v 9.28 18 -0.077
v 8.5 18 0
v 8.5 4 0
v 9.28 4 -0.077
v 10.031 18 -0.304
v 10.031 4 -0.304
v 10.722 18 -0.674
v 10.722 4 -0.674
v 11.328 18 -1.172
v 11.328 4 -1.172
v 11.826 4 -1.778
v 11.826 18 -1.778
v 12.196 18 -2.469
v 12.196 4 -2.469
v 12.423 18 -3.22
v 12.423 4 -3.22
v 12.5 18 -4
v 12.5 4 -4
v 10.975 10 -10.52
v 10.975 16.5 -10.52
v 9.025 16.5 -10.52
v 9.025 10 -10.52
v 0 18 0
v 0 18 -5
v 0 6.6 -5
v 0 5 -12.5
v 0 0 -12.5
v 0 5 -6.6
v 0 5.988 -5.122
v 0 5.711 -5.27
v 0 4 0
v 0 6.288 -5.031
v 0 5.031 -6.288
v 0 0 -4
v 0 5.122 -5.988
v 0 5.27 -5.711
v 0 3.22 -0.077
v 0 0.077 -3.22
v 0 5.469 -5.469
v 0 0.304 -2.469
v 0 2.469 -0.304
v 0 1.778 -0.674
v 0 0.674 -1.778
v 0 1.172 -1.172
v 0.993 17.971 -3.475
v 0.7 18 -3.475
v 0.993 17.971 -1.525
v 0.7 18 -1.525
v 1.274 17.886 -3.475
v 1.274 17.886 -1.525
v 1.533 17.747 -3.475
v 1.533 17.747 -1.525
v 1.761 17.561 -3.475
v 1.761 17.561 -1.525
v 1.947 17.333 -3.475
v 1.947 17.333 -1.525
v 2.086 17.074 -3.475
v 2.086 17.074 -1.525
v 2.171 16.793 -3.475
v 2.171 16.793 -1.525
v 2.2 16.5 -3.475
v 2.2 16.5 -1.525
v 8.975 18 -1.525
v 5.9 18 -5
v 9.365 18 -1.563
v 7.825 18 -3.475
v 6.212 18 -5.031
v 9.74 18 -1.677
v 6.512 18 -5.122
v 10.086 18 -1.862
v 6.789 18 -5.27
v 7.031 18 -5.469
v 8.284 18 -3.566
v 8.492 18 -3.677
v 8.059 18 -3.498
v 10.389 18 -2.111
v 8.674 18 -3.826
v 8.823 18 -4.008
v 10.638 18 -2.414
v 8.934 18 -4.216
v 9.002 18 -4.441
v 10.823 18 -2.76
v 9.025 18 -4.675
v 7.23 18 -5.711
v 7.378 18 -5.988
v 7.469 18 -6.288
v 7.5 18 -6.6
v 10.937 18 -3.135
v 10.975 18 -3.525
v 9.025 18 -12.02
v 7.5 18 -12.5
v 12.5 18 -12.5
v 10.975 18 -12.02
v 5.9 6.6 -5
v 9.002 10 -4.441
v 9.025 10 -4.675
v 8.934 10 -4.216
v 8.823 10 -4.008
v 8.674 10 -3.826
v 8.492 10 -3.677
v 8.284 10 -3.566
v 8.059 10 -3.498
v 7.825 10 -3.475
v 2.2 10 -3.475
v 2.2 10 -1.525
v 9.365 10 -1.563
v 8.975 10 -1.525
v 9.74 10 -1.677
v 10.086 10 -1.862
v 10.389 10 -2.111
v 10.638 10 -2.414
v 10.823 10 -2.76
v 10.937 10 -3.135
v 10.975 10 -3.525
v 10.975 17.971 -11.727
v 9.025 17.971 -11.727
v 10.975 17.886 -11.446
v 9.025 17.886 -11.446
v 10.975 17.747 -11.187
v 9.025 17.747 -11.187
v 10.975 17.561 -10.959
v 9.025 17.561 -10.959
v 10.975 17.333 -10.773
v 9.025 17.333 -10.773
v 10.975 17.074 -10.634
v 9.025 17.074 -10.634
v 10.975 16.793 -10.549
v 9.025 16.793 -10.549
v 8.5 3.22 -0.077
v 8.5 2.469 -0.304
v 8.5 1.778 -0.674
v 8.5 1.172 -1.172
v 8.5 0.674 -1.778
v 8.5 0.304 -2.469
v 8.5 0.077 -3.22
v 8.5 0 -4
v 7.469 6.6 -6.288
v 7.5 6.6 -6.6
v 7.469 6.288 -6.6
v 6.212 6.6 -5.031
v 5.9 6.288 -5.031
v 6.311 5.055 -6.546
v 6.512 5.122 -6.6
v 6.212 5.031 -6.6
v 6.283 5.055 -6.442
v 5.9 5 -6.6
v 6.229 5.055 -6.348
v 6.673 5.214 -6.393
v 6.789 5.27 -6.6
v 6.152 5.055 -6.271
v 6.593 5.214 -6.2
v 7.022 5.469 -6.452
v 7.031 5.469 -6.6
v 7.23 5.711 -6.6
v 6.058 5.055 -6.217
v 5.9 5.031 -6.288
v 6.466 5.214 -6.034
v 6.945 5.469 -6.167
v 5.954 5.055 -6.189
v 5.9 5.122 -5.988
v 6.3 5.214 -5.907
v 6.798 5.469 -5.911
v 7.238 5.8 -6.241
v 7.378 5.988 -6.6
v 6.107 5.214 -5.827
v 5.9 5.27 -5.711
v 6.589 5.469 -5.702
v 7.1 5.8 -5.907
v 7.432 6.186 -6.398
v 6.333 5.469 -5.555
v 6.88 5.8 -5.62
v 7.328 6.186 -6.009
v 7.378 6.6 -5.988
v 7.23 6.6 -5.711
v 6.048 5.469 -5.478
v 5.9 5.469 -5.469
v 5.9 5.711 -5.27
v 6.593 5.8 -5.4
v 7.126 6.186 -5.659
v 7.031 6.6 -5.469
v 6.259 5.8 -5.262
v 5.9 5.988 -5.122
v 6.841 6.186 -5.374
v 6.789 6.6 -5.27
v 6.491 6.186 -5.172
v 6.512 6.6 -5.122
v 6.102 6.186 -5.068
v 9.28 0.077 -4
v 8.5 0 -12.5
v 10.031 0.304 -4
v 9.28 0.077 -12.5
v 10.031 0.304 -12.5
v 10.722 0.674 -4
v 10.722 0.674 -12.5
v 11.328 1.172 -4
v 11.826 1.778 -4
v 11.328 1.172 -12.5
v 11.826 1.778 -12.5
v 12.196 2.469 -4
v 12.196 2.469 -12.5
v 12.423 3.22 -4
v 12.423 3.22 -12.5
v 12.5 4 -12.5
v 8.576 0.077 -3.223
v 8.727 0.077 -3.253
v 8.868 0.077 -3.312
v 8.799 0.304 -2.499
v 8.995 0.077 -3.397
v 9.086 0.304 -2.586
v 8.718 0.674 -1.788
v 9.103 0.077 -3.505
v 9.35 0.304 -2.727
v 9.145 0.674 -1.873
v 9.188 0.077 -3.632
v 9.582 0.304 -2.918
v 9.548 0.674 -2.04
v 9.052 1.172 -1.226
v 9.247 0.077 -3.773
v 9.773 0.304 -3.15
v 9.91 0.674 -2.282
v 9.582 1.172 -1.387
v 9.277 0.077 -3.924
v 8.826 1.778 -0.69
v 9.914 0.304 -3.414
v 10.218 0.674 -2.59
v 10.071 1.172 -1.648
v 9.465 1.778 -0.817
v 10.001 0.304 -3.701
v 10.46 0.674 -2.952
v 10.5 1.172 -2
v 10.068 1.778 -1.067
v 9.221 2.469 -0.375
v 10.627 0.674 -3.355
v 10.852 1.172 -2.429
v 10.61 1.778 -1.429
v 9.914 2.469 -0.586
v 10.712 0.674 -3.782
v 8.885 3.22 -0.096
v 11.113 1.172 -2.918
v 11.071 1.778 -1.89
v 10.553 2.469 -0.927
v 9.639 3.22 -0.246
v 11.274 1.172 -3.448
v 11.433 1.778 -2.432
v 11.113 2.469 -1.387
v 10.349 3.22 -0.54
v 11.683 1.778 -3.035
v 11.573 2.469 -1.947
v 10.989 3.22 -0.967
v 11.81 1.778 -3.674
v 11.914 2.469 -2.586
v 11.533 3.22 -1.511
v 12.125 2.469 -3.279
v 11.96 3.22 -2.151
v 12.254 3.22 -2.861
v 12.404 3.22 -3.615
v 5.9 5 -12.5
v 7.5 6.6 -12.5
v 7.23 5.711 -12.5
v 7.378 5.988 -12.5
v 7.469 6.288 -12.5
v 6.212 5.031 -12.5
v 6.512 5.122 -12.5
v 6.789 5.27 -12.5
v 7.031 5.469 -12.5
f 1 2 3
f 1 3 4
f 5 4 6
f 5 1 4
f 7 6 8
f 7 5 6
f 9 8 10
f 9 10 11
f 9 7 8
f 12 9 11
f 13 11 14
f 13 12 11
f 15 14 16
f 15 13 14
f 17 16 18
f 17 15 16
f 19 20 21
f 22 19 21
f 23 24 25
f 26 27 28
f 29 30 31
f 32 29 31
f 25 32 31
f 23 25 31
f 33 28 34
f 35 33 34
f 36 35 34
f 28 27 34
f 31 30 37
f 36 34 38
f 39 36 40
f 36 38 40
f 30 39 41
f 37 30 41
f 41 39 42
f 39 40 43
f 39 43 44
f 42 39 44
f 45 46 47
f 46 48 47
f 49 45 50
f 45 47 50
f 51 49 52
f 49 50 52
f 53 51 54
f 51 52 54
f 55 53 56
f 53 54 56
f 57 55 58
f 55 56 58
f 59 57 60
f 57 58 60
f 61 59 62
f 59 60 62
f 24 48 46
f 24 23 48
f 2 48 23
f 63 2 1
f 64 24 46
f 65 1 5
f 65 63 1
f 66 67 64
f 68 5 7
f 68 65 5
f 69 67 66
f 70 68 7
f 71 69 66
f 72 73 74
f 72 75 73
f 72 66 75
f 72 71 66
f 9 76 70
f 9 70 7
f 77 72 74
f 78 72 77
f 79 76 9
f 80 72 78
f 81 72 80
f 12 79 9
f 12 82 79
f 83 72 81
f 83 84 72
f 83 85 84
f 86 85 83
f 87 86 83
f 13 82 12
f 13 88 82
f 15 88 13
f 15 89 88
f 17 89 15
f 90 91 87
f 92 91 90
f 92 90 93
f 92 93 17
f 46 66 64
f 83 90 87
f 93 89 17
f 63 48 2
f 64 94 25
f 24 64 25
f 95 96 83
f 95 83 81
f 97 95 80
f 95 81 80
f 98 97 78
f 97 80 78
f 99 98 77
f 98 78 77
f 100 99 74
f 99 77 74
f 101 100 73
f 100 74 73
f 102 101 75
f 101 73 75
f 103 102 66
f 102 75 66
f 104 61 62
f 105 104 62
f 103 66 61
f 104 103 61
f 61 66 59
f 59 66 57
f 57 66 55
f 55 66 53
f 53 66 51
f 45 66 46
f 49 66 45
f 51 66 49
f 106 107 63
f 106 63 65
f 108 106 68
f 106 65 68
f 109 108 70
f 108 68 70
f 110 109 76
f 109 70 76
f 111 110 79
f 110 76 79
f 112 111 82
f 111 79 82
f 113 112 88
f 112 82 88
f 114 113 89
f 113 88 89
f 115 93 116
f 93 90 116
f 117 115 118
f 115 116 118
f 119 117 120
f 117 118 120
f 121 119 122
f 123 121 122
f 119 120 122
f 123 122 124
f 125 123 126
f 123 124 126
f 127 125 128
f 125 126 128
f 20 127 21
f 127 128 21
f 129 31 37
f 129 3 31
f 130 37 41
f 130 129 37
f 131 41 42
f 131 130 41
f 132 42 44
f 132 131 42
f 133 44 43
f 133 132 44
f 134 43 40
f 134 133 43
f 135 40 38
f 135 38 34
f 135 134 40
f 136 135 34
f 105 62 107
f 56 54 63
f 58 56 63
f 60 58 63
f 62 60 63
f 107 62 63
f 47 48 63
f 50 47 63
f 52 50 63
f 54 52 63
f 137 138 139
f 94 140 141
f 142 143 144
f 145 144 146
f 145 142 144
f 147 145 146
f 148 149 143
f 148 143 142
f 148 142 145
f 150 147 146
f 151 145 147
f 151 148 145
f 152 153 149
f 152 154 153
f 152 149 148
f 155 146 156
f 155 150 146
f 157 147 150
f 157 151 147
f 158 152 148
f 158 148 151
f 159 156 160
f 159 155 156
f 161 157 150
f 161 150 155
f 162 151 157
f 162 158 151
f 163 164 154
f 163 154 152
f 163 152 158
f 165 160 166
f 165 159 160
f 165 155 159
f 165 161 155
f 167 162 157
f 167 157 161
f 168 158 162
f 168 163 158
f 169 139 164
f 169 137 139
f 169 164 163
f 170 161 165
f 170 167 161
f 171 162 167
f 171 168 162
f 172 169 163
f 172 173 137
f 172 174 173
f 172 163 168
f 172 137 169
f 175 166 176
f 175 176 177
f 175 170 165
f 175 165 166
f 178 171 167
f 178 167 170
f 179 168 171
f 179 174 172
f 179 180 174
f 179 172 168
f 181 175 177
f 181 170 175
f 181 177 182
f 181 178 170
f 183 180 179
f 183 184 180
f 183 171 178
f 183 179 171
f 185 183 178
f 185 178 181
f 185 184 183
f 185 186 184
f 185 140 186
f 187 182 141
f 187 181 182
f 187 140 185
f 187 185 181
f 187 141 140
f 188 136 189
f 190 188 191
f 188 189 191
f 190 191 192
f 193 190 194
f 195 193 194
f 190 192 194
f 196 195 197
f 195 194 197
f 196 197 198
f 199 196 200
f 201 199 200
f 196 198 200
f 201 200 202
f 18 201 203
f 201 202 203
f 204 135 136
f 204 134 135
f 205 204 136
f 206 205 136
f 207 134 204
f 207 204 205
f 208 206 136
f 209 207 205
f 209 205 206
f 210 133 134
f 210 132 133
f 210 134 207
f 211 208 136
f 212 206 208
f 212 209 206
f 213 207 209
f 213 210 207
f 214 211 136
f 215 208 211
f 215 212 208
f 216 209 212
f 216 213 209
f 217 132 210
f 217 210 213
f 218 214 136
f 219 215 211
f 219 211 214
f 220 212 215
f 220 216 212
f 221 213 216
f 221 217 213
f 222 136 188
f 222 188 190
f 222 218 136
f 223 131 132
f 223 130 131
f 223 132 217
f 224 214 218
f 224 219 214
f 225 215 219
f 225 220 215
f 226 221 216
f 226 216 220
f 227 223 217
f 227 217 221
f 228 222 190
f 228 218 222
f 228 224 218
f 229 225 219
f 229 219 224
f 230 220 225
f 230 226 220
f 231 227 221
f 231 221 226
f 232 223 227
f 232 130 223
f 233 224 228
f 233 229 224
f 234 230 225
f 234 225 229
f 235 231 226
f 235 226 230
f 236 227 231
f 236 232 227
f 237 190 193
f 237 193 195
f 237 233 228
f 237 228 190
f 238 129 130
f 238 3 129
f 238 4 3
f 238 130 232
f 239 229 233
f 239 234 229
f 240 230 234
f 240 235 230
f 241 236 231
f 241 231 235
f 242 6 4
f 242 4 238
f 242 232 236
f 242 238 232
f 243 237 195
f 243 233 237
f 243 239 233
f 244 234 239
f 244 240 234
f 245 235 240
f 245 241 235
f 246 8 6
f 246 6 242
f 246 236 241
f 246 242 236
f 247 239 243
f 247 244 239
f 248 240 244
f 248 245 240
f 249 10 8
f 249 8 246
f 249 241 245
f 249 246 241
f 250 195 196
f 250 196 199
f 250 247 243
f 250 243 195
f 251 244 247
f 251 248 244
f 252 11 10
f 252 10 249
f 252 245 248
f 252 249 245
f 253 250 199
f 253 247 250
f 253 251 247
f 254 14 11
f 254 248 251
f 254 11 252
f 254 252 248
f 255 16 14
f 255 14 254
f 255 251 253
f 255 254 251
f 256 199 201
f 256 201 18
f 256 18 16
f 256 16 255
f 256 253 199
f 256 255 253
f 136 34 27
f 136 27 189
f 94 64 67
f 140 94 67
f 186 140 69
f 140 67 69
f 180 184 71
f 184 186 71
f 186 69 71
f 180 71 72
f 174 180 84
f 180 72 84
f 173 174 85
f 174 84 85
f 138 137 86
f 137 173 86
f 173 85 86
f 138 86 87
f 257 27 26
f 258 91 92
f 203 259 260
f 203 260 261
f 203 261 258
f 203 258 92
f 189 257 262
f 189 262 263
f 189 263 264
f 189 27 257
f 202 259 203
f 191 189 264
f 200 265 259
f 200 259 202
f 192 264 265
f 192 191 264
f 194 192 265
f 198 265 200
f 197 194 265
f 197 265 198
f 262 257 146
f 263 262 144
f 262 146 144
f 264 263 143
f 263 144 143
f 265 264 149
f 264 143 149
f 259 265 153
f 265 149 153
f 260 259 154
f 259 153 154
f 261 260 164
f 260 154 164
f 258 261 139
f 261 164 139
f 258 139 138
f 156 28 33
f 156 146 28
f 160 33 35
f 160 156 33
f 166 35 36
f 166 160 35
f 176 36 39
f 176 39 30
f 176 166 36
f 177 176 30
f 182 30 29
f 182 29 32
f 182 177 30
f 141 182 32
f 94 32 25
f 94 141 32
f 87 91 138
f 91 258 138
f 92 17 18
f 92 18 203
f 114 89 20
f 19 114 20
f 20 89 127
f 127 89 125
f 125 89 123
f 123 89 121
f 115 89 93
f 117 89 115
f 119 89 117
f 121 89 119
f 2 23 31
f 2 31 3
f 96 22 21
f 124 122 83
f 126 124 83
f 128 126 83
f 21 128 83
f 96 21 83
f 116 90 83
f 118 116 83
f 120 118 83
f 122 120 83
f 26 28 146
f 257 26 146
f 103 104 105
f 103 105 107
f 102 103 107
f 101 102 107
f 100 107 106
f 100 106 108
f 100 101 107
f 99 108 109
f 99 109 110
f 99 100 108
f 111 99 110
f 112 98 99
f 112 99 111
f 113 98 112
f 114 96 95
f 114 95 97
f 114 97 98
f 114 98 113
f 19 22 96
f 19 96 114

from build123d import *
from OCP.BRepFilletAPI import BRepFilletAPI_MakeFillet

# Parameters (mm, degrees)
BOSS_EXTRUDE1_DEPTH = 18
SKETCH3_W           = 7.5
SKETCH3_H           = 7.5
BOSS_EXTRUDE2_DEPTH = 5
CUT_EXTRUDE1_DEPTH  = 8
FILLET1_R1          = 4
FILLET1_R2          = 1.6
FILLET1_R3          = 1.5


with BuildPart() as part:
    # Sketch1 → Boss-Extrude1 (new body)
    with BuildSketch(Plane(origin=(0, 0, 0), x_dir=(1, 0, 0), z_dir=(0, 1, 0))):
        Polygon((0, 0), (12.5, 0), (12.5, 12.5), (7.5, 12.5), (7.5, 5), (0, 5), align=None)
    extrude(amount=BOSS_EXTRUDE1_DEPTH)

    # Sketch3 → Boss-Extrude2 (add)
    with BuildSketch(Plane.XZ):
        with Locations((3.75, -8.75)):
            Rectangle(SKETCH3_W, SKETCH3_H)
    extrude(amount=-BOSS_EXTRUDE2_DEPTH)

    # Sketch2 → Cut-Extrude1 (cut)
    with BuildSketch(Plane(origin=(0, 18, 0), x_dir=(1, 0, 0), z_dir=(0, 1, 0))):
        with BuildLine():
            Line((9.025, 10.52), (9.025, 4.675))
            ThreePointArc((9.025, 4.675), (8.673528137, 3.826471863), (7.825, 3.475))
            Line((7.825, 3.475), (2.2, 3.475))
            Line((2.2, 3.475), (2.2, 1.525))
            Line((2.2, 1.525), (8.975, 1.525))
            ThreePointArc((8.975, 1.525), (10.389213562, 2.110786438), (10.975, 3.525))
            Line((10.975, 3.525), (10.975, 10.52))
            Line((10.975, 10.52), (9.025, 10.52))
        make_face()
    extrude(amount=-CUT_EXTRUDE1_DEPTH, mode=Mode.SUBTRACT)

    # Fillet1: one fillet with a radius per group of edges: ONE call of the kernel's fillet builder (fillet() takes one radius for all edges)
    fillet1_edges_1 = [part.edges().sort_by_distance(p)[0] for p in [
        (12.5, 9, 0),
        (6.25, 0, 0),
        (12.5, 0, -6.25),
    ]]
    fillet1_edges_2 = [part.edges().sort_by_distance(p)[0] for p in [
        (7.5, 11.5, -5),
        (7.5, 5, -8.75),
        (3.75, 5, -5),
    ]]
    fillet1_edges_3 = [part.edges().sort_by_distance(p)[0] for p in [
        (2.2, 18, -2.5),
        (10, 18, -10.52),
    ]]
    fillet1 = BRepFilletAPI_MakeFillet(part.part.solid().wrapped)
    for e in fillet1_edges_1:
        fillet1.Add(FILLET1_R1, e.wrapped)
    for e in fillet1_edges_2:
        fillet1.Add(FILLET1_R2, e.wrapped)
    for e in fillet1_edges_3:
        fillet1.Add(FILLET1_R3, e.wrapped)
    add(Compound.cast(fillet1.Shape()), mode=Mode.REPLACE)


solid = part.part
